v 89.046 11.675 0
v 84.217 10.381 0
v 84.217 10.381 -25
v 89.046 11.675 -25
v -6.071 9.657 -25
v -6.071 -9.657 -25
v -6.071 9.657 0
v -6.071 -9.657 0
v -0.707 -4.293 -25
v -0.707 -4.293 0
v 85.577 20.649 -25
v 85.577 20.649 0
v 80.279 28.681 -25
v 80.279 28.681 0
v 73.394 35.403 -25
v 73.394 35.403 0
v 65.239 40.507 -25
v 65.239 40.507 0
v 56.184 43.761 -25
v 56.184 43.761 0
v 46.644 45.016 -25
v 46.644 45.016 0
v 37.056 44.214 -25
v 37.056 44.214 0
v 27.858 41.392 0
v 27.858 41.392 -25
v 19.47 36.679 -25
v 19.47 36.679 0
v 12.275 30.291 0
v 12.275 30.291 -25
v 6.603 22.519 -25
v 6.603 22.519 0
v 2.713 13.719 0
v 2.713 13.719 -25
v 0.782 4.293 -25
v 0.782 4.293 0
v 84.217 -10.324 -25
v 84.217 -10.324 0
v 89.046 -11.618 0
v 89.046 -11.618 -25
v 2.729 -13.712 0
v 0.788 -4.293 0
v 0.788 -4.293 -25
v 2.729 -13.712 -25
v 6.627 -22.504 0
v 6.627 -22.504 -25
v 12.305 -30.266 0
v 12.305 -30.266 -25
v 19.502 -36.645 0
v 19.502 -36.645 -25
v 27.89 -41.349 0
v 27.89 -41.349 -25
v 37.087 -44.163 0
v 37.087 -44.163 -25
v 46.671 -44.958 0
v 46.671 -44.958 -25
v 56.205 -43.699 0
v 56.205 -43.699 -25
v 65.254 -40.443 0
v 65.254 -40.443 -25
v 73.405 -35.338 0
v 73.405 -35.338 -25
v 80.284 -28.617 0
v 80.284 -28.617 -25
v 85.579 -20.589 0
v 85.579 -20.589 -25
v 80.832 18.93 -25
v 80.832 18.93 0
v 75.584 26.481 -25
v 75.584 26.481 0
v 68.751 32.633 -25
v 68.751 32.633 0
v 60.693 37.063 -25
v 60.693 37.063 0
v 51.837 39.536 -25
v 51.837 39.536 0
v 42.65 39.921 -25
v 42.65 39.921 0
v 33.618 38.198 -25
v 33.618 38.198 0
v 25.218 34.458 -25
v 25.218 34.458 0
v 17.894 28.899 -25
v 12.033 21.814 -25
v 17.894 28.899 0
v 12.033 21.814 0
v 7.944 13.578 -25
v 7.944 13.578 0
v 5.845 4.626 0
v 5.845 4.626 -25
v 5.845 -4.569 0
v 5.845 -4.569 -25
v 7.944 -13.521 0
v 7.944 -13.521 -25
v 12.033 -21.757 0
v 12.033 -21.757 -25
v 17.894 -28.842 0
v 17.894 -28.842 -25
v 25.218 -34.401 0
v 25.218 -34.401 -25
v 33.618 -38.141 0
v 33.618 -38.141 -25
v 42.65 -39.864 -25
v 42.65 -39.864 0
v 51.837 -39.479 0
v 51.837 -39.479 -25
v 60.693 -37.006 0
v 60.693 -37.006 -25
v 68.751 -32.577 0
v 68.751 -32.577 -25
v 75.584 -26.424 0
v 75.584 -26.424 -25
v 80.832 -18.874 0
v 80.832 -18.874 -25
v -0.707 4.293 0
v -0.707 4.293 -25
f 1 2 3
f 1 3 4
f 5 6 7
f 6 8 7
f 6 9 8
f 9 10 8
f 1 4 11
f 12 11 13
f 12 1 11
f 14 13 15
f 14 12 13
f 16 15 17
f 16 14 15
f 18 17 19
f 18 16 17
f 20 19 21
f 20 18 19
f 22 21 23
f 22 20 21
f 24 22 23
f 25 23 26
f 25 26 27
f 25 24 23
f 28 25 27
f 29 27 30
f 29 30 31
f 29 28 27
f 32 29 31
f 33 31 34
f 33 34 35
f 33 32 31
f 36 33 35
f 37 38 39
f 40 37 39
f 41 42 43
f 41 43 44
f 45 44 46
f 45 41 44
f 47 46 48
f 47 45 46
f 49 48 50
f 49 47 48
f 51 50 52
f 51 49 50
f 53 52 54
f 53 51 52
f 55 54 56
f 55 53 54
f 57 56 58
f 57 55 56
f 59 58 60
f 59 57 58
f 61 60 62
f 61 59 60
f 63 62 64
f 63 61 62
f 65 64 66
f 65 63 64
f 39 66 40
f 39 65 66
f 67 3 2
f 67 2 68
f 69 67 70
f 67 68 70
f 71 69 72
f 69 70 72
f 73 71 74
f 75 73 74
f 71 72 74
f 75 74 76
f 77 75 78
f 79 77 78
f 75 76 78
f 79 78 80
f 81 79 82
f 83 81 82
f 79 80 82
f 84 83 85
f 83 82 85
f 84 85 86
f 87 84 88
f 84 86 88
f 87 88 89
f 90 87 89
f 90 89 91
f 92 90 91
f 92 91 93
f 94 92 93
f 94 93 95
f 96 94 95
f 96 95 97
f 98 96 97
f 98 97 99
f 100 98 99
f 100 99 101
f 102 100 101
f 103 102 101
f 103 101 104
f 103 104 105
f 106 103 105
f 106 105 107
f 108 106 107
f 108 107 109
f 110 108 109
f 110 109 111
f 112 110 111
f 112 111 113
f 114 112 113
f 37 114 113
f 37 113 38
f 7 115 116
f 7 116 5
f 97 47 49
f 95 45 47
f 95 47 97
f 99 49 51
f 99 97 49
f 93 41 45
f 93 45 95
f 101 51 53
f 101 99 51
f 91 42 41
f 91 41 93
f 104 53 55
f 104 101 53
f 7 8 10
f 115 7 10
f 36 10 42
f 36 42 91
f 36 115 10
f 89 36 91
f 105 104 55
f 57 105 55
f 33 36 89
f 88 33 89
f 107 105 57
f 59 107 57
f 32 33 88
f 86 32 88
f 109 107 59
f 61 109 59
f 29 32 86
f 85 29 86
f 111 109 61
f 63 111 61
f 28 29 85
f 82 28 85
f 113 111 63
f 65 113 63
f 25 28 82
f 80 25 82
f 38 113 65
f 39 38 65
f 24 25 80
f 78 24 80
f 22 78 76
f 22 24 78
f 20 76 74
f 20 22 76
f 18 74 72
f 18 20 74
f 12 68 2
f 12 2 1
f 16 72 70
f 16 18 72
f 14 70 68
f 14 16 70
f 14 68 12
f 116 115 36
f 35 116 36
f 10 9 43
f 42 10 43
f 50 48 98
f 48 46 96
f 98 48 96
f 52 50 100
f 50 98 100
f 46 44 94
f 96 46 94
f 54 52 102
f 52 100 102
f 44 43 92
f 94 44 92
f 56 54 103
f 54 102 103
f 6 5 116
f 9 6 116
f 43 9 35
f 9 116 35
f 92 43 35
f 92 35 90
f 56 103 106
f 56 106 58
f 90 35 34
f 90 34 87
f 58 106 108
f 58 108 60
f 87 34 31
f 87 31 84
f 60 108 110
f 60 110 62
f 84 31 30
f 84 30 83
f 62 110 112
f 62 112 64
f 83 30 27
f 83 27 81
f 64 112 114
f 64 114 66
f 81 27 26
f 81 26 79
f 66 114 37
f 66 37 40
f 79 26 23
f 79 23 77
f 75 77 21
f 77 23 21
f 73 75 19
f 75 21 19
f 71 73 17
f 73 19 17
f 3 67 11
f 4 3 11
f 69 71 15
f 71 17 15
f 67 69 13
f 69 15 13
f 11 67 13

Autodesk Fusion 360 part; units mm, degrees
sketch "Sketch1" plane through (0, 0, 0) normal (0, 0, 1) x (1, 0, 0)
  line L0 (0, 0) -> (0, -5)
  line L1 (0, 0) -> (0, 5)
  line L2 (0, 5) -> (-7.0711, 12.0711)
  line L3 (0, -5) -> (-7.0711, -12.0711)
  line L4 (-7.0711, -12.0711) -> (-7.0711, 12.0711)
  circle A0 centre (45.5796, 0.0284) radius 40
  circle A1 centre (45.5796, 0.0284) radius 45
  line L5 (0, 5) -> (0.855, 5)
  line L6 (0, -5) -> (0.8614, -5)
  line L7 (-0.7071, -4.2929) -> (-6.0711, -9.6569)
  line L8 (-6.0711, -9.6569) -> (-6.0711, 9.6569)
  line L9 (-0.7071, 4.2929) -> (-6.0711, 9.6569)
  line L10 (-0.7071, 4.2929) -> (0.7821, 4.2929)
  line L11 (-0.7071, -4.2929) -> (0.7875, -4.2929)
  line L12 (45.5796, 0.0284) -> (97, 0.0284) construction
  line L13 (45.5796, 0.0284) -> (89.0462, -11.6185)
  line L14 (45.5796, 0.0284) -> (89.0462, 11.6752)
  dimension "d1" = 5
  dimension "d2" = 10
  dimension "d3" = 10
  dimension "d4" = 80
  dimension "d5" = 5
  dimension "d6" = 1
  dimension "d11" = 15
  dimension "d12" = 15
extrude "Extrude3" add sketch "Sketch1" against normal blind 15 contours A0 A1 L13 L14 picked at (87.9713, -8.774) makes body 1
extrude "Extrude1" add sketch "Sketch1" against normal blind 25 separate body contours L0 L1 A1 L10 L11 | L0 L1 L7 L8 L9 L10 L11 makes body 2
combine "Combine1" operation cut target body 2 tool bodies 1
extrude "Extrude4" add sketch "Sketch1" against normal blind 25 contours A0 A1 L13 L14 picked at (3.1611, -8.3994) bodies 2
